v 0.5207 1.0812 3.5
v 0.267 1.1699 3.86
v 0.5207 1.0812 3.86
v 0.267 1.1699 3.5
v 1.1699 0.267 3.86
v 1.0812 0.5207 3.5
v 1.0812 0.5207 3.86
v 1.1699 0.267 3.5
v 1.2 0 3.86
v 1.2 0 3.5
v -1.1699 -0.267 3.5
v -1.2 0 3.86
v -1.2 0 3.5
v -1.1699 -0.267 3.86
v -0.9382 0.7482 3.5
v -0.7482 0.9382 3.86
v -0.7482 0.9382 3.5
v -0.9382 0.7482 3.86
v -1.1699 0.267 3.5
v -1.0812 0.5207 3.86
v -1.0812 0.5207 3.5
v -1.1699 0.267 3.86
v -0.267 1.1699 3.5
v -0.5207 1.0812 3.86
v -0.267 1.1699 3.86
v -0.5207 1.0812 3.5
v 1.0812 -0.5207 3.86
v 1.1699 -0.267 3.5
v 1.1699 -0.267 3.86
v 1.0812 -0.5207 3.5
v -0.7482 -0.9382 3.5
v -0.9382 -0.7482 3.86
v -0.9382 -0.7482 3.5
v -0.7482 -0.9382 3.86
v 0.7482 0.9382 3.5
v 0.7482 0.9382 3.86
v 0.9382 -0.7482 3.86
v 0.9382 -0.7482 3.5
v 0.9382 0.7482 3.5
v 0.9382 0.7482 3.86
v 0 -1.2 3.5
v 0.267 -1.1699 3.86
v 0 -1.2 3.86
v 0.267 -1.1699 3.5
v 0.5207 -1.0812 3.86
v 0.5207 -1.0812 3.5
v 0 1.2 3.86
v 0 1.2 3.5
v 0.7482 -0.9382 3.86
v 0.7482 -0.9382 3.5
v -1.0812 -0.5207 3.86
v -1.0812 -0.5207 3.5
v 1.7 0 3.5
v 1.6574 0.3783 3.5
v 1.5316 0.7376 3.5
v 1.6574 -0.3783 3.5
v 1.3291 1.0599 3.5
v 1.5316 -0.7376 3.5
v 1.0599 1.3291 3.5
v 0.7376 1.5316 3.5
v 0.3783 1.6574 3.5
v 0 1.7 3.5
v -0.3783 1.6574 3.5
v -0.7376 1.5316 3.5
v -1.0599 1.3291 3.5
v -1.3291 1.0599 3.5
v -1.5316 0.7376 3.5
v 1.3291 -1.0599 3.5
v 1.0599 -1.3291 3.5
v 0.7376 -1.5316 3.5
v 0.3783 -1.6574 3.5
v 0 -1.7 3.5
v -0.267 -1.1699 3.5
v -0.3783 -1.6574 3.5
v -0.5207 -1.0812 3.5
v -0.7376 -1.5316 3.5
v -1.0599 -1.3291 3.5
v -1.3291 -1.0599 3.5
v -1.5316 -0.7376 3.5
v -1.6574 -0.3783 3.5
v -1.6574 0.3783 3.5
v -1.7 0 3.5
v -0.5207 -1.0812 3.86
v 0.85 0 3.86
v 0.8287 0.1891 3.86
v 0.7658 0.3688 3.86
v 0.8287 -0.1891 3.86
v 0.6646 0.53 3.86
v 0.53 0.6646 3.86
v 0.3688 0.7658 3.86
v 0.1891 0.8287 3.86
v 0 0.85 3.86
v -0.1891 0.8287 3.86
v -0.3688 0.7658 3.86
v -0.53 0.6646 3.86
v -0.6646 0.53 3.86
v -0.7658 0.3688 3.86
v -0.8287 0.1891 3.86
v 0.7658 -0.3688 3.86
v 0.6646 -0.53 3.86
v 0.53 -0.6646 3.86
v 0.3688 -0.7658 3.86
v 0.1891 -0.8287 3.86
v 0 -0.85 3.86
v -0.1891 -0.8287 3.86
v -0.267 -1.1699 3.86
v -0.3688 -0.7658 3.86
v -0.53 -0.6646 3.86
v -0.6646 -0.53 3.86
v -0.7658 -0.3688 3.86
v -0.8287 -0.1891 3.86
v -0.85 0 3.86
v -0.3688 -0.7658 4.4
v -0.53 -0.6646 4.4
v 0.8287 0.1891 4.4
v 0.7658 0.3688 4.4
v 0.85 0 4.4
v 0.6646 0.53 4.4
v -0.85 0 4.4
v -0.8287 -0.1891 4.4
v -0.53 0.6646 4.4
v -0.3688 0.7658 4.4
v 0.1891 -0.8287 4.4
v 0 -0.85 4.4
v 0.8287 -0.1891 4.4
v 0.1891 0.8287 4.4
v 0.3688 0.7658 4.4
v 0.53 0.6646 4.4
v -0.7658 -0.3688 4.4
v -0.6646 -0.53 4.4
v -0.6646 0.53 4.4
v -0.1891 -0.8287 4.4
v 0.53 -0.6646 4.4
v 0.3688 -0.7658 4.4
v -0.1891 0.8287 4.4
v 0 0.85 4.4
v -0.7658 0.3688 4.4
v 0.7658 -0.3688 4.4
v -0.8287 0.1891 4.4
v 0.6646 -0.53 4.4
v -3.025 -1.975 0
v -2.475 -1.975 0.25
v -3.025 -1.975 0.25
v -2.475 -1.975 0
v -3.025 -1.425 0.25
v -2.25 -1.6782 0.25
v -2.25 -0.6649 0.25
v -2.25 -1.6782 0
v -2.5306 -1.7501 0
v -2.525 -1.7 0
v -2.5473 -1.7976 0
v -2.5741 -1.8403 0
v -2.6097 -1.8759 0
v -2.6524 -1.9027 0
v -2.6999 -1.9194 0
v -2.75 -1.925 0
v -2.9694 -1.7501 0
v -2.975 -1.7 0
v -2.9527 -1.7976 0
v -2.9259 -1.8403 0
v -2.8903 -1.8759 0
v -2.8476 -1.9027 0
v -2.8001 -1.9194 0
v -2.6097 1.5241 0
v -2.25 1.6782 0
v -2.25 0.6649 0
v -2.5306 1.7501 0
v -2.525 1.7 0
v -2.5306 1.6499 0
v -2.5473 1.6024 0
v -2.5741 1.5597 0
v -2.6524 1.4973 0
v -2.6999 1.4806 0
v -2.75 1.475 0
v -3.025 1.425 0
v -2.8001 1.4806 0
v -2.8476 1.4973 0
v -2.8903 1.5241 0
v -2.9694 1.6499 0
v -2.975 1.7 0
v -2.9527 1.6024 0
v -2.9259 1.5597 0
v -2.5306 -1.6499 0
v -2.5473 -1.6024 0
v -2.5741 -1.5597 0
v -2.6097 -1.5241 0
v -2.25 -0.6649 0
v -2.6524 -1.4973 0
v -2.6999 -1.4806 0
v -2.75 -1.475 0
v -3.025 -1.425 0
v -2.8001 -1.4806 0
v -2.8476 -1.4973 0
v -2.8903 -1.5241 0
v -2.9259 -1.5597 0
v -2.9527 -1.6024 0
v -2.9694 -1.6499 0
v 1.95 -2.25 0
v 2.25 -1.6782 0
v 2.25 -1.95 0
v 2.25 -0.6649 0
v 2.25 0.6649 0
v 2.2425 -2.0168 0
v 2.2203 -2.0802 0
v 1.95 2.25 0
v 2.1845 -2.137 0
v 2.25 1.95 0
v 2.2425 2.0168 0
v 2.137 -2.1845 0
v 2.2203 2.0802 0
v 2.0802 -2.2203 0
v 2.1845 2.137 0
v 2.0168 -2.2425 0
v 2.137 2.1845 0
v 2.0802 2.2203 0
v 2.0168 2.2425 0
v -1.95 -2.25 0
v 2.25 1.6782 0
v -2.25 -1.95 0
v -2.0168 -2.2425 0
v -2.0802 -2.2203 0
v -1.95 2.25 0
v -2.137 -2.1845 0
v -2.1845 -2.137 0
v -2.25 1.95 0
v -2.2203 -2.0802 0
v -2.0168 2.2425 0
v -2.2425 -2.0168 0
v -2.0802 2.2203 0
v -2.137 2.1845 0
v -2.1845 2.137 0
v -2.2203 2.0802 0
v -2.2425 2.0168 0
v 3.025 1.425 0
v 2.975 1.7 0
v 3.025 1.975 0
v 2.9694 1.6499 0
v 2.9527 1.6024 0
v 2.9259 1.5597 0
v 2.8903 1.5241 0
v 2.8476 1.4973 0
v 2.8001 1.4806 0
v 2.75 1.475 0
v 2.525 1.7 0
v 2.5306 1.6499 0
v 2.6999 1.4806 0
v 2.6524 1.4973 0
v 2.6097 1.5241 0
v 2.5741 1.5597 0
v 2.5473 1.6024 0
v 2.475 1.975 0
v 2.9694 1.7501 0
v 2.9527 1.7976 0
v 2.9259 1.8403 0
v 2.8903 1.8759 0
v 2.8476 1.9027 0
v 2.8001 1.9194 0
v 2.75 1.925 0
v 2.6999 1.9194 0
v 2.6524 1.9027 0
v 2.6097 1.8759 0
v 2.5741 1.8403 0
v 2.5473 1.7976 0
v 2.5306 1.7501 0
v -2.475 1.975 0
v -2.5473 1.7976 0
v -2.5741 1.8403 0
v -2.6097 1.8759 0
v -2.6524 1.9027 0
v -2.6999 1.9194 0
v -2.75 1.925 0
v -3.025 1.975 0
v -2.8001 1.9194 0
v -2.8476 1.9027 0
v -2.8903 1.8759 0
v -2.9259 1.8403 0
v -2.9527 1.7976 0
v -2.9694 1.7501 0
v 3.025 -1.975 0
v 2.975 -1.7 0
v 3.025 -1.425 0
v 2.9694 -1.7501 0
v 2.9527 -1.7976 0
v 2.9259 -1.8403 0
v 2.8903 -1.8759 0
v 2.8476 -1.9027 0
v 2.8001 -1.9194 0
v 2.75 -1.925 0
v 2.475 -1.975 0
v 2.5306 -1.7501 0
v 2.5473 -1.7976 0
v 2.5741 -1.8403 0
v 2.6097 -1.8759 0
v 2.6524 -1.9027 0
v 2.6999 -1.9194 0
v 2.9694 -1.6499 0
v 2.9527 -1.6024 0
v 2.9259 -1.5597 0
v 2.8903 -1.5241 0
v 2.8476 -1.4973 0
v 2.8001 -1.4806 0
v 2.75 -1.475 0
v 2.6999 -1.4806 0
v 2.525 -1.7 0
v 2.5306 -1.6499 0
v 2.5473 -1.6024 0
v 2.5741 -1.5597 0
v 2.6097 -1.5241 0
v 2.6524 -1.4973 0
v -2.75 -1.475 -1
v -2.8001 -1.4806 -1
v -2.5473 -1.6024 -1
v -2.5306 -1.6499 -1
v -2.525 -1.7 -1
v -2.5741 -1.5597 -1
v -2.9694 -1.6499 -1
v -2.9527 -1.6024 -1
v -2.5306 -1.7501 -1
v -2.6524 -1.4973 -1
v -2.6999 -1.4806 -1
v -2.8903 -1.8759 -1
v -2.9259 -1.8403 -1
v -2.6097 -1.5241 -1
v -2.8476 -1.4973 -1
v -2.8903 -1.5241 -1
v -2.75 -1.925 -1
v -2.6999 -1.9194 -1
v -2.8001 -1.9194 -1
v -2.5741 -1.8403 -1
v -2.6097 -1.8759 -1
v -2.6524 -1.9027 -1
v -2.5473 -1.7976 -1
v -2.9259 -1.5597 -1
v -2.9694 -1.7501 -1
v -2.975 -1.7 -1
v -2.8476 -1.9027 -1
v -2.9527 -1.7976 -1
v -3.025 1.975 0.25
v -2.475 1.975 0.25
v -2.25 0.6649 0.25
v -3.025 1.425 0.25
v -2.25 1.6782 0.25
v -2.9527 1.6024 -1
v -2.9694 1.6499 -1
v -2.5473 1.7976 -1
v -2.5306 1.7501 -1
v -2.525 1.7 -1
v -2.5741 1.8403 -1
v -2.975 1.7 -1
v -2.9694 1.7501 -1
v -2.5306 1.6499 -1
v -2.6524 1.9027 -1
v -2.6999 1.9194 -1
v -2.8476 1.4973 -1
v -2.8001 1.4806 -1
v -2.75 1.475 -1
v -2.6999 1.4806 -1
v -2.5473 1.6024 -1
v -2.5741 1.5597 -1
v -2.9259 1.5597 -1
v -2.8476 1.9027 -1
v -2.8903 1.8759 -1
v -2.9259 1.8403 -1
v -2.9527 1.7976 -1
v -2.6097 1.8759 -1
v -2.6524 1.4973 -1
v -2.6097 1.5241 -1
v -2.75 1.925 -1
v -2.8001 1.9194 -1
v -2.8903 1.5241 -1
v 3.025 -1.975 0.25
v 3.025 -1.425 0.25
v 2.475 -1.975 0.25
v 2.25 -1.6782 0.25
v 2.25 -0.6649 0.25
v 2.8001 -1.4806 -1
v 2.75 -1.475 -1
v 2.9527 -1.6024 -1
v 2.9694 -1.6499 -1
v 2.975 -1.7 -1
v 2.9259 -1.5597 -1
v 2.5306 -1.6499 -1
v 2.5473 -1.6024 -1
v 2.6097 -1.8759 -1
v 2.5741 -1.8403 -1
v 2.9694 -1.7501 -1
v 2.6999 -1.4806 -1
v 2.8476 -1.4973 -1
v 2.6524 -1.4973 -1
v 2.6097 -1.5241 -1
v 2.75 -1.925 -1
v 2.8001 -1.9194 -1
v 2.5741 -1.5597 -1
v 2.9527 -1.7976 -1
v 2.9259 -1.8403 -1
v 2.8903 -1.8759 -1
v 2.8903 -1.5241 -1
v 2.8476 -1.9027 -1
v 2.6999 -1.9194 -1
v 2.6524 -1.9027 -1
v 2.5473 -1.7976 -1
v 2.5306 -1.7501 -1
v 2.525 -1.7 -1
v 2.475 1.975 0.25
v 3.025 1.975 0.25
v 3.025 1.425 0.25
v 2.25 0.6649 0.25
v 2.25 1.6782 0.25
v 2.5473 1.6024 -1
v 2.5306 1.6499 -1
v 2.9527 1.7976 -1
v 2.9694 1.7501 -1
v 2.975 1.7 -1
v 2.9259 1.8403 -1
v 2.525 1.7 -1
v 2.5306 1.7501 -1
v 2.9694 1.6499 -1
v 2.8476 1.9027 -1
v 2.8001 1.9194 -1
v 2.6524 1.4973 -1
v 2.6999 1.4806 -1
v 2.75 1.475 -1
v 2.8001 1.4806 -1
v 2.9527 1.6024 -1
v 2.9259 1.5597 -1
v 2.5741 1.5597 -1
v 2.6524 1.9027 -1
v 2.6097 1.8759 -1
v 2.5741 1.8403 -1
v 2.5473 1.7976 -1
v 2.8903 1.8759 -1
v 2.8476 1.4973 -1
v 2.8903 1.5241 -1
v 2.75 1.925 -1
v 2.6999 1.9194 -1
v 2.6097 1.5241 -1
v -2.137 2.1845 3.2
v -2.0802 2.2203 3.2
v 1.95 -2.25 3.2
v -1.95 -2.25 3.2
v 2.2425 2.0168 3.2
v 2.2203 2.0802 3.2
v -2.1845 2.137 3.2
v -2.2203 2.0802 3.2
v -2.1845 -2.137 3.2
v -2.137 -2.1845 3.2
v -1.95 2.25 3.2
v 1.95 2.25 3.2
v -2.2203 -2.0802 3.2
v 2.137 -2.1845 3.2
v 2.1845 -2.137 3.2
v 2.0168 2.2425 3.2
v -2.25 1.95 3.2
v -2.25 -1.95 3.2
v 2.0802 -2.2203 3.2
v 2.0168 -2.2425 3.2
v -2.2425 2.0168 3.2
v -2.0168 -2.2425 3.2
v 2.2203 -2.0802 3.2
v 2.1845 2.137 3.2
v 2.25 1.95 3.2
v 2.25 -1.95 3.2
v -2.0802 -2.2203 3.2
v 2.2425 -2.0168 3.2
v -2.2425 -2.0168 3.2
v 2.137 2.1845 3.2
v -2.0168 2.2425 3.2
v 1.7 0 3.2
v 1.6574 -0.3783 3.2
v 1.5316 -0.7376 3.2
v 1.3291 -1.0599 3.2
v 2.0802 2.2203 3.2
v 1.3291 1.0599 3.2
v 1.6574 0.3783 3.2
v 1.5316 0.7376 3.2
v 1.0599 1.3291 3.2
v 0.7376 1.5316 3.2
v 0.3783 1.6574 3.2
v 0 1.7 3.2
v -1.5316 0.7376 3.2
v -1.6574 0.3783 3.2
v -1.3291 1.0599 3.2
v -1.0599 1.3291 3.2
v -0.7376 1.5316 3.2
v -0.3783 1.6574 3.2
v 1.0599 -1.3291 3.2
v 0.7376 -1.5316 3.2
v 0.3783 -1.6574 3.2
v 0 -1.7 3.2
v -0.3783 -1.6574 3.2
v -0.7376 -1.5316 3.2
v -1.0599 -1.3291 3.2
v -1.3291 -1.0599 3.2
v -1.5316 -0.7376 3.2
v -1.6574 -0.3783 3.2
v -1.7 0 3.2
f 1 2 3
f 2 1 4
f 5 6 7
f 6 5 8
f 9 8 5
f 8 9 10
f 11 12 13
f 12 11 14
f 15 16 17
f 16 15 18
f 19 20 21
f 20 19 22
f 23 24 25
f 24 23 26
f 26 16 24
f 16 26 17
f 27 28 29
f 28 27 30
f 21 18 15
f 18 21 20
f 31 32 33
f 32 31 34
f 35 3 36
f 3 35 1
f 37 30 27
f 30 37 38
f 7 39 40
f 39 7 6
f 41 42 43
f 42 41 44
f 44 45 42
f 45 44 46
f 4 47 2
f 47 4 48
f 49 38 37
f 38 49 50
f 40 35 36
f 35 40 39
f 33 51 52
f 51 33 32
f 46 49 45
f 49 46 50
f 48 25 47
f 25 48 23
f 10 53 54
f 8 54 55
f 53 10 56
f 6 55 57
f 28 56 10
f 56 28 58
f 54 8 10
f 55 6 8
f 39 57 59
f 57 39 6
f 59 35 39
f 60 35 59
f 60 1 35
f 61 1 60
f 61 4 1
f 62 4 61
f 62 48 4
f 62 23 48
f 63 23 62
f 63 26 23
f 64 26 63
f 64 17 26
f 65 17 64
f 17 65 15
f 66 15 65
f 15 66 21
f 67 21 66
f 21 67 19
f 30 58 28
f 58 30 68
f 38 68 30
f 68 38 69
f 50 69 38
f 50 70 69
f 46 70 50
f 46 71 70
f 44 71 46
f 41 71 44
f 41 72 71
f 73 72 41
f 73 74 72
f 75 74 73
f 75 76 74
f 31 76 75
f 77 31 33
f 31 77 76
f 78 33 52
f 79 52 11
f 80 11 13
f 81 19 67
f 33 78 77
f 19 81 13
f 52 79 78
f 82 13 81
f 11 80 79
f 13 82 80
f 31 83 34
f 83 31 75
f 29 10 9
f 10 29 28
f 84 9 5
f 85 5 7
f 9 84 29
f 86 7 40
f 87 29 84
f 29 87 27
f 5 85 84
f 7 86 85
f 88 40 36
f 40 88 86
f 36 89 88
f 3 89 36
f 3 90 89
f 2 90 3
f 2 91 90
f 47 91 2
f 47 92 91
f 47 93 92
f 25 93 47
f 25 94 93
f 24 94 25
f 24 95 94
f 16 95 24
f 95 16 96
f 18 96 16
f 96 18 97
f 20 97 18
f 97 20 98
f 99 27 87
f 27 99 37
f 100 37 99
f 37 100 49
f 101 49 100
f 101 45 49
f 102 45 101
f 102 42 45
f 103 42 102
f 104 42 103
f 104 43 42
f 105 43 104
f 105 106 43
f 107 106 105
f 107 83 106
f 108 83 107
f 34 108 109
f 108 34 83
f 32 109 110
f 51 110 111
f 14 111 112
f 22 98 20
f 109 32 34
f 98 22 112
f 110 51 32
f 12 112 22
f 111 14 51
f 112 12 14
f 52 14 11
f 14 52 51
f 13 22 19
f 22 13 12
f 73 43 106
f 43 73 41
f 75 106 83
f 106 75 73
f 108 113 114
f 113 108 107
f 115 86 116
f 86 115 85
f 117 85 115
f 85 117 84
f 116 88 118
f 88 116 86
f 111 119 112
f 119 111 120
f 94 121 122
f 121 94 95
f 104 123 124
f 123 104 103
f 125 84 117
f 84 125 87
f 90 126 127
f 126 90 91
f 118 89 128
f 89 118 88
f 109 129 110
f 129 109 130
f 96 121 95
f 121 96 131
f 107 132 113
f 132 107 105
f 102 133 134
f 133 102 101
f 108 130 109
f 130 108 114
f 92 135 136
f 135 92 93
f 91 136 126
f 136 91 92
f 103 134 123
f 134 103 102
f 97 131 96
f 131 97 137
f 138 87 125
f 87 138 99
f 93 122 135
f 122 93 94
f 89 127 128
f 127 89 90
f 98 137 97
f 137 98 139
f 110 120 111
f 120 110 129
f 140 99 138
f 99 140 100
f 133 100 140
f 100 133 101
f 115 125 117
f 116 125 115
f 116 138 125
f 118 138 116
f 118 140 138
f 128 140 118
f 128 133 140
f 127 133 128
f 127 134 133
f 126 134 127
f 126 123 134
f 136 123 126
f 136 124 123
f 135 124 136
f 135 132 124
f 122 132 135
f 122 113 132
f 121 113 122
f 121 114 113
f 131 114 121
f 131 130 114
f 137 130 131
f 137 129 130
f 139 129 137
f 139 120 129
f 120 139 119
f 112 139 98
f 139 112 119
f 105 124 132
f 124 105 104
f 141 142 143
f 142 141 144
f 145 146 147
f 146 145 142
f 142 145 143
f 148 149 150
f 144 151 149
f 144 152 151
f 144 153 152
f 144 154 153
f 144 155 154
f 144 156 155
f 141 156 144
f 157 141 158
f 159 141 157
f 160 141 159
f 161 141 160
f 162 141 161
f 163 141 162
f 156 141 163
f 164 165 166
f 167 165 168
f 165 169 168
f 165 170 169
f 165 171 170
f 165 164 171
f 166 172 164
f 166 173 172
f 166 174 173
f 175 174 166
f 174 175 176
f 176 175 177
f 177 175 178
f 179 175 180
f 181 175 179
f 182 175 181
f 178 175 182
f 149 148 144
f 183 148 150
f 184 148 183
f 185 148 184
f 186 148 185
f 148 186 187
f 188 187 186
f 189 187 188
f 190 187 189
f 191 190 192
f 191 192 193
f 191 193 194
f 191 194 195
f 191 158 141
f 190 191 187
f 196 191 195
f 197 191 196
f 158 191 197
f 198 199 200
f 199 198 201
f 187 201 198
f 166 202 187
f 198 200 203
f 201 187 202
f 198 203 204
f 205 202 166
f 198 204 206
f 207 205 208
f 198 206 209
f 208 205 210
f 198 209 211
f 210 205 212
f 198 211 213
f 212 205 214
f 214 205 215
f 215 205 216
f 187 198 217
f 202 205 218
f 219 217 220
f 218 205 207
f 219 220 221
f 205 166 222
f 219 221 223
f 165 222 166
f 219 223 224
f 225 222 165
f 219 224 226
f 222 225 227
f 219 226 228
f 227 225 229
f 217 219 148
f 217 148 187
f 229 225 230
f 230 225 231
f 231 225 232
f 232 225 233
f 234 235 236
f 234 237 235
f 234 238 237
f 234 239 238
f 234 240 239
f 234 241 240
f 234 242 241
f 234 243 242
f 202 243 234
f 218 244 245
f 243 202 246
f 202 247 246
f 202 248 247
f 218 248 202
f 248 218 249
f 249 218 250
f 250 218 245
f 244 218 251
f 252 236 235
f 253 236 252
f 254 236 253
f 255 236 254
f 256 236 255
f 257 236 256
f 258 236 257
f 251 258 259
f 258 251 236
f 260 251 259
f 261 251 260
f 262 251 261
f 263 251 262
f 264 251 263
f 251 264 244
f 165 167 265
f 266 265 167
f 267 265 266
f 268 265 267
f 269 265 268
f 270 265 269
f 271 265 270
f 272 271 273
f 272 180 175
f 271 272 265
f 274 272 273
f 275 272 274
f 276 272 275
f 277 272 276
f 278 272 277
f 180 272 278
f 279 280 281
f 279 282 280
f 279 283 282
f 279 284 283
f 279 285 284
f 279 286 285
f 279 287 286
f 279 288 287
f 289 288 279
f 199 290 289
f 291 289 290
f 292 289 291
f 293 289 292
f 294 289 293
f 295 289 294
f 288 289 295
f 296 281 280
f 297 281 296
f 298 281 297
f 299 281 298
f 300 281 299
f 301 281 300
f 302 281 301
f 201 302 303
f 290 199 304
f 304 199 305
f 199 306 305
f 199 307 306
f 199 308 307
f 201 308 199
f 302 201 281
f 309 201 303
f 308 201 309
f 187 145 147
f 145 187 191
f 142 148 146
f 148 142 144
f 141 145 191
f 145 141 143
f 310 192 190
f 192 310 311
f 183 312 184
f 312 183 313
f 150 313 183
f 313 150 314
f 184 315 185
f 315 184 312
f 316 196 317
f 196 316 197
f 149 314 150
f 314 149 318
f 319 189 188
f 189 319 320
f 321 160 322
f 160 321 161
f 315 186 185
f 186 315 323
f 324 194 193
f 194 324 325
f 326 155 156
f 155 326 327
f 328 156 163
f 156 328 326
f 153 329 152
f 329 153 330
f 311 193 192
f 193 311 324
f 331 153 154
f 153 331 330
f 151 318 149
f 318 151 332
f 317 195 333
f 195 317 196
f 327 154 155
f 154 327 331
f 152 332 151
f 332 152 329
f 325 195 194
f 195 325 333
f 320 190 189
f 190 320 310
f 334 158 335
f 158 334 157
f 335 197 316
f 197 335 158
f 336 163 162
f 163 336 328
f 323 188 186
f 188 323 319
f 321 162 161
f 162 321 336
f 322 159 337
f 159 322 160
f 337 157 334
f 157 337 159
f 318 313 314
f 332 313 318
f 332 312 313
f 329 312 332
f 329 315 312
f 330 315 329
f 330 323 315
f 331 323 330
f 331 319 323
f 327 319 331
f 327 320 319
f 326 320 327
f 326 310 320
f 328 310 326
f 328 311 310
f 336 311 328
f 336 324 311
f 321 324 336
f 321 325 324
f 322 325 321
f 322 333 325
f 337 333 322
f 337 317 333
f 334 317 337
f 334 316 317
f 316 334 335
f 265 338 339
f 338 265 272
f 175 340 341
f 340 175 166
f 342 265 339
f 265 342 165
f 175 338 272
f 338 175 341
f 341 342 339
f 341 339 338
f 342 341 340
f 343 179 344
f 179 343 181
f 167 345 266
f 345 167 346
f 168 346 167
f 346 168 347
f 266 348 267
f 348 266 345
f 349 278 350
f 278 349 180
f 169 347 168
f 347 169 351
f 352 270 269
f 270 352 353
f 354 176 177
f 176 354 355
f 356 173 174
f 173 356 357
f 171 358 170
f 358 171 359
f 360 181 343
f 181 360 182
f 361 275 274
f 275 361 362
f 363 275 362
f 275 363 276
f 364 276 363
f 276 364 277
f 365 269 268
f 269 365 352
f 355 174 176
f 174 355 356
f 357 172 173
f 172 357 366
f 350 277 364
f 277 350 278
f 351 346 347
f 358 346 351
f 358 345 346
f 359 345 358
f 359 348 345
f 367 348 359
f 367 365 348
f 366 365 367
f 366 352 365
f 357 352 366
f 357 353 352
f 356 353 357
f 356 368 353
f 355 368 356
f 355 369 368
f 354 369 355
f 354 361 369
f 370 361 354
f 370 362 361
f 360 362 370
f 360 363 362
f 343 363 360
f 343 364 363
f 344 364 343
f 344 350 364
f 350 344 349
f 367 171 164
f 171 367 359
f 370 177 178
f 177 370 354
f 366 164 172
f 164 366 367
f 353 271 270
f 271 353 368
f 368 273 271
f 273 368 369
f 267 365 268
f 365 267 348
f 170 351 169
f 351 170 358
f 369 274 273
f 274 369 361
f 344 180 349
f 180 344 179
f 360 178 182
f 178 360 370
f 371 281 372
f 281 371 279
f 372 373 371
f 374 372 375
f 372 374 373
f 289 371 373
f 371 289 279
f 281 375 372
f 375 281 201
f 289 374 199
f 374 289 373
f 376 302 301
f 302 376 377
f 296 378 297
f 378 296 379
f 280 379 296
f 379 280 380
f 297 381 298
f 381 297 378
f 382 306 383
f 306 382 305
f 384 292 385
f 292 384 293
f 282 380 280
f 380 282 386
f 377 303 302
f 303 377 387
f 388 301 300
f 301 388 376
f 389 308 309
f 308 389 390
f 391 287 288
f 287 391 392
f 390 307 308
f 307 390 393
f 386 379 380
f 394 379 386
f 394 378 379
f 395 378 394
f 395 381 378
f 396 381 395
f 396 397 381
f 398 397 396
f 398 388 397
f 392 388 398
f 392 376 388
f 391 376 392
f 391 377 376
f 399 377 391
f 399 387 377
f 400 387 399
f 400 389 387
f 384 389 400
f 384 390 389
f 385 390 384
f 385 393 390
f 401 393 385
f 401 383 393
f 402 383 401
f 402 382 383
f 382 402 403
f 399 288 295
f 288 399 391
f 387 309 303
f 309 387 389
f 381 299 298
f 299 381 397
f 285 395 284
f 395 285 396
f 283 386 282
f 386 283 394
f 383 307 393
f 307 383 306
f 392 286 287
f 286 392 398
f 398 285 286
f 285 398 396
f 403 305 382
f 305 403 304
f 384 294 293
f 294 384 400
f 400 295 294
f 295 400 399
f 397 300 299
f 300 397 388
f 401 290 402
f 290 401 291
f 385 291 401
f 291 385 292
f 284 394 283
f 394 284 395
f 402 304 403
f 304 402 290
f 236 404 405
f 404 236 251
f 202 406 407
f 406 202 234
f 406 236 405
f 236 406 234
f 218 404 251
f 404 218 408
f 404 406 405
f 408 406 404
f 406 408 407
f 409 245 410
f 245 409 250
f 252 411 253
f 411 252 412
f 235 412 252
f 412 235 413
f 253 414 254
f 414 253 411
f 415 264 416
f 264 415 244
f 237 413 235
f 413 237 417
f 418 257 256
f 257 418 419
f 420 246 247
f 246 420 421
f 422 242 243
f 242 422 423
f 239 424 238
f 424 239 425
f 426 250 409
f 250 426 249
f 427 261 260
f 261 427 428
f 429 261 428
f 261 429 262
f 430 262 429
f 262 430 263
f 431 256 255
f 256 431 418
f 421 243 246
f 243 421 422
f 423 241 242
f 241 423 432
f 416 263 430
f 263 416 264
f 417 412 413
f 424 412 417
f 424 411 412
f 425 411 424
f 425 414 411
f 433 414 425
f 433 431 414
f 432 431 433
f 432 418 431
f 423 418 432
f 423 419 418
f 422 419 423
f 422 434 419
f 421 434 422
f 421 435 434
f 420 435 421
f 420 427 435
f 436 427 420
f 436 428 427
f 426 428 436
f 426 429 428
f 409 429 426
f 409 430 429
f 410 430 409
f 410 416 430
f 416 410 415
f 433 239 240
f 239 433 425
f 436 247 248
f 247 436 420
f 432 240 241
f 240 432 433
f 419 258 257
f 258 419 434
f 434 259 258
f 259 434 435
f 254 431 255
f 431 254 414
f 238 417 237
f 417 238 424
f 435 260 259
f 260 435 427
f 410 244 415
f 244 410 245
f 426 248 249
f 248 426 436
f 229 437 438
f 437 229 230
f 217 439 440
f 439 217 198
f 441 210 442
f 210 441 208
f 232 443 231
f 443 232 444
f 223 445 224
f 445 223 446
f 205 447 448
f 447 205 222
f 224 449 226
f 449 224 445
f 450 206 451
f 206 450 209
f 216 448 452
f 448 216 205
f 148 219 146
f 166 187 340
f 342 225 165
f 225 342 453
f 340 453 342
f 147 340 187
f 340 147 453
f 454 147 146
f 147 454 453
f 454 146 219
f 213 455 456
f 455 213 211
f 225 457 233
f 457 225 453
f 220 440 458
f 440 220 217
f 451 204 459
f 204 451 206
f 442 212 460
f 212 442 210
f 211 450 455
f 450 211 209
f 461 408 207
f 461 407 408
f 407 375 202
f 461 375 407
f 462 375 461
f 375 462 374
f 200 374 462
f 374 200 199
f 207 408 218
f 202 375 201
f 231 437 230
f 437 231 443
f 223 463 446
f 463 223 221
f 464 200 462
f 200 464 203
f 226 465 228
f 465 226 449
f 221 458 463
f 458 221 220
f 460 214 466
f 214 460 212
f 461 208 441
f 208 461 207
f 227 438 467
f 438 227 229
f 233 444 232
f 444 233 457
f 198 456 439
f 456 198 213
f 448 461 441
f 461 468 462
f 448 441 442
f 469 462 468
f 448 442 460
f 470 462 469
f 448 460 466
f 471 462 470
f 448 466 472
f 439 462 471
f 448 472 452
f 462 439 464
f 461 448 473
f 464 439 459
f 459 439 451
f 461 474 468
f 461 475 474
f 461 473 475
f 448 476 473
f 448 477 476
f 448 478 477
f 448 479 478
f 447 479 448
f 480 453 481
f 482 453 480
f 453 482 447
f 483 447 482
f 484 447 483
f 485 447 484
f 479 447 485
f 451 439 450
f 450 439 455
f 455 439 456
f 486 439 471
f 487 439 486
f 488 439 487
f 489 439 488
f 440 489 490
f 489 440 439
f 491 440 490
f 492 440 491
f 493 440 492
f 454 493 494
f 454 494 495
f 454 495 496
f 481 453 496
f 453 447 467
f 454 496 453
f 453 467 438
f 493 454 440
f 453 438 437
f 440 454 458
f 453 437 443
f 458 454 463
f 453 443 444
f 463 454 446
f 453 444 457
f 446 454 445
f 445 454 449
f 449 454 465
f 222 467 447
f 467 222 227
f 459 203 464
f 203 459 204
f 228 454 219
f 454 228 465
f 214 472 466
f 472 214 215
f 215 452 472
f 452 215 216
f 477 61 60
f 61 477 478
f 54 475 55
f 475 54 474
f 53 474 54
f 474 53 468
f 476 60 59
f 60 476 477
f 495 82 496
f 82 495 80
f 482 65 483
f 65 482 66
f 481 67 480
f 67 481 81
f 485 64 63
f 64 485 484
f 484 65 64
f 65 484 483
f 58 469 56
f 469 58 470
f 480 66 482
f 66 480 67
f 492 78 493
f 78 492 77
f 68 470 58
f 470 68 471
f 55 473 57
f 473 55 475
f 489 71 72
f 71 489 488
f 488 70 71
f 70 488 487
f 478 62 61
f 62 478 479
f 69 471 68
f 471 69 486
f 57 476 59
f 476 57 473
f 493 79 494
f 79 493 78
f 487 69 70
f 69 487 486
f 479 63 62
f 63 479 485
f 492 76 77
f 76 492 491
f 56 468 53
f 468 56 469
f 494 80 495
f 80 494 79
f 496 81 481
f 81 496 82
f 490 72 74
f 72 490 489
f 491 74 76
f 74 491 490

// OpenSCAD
// SW_SPST_4.5×4.5 THT — 焊盘中心 (±2.75, ±1.7) 与封装一致
// 金属爪从壳体边沿弯到焊盘再穿板；板厚 1.0 → 板下只留短焊脚
$fn = 28;

body = 4.5;
body_h = 3.20;
cap_t = 0.30;
act_d = 2.40;
act_h = 0.90;
stem_d = 1.70;
// 板下露出：约 1.0mm（1.0 板厚 + 少许焊脚，不再 3.2）
pin_below = 1.00;
pin_d = 0.45;
claw_t = 0.25;
claw_w = 0.55;
pad_xs = [-2.75, 2.75];
pad_ys = [-1.70, 1.70];

module rounded_box(w, d, h, r) {
  rr = min(r, w / 2 - 0.05, d / 2 - 0.05);
  hull()
    for (sx = [-1, 1], sy = [-1, 1])
      translate([sx * (w / 2 - rr), sy * (d / 2 - rr), 0])
        cylinder(h = h, r = rr);
}

// 一只爪：壳体侧壁 → 水平伸出到焊盘 XY → 竖直短脚穿板
module claw(px, py) {
  // 从壳体底边朝焊盘方向的水平臂（贴地）
  bx = (px > 0 ? 1 : -1) * (body / 2);
  hull() {
    translate([bx * 0.92, py * 0.55, claw_t / 2])
      cube([0.35, claw_w, claw_t], center = true);
    translate([px, py, claw_t / 2])
      cube([claw_w, claw_w, claw_t], center = true);
  }
  // 穿板短脚（Z=0 为 F.Cu，向下为负）
  translate([px, py, -pin_below / 2])
    cylinder(h = pin_below, d = pin_d, center = true);
}

color([0.18, 0.18, 0.2])
  rounded_box(body, body, body_h, 0.30);

color([0.10, 0.10, 0.11])
  translate([0, 0, body_h])
    cylinder(h = cap_t, d = act_d + 1.0);

color([0.08, 0.08, 0.09]) {
  translate([0, 0, body_h + cap_t])
    cylinder(h = act_h * 0.4, d = act_d);
  translate([0, 0, body_h + cap_t + act_h * 0.4])
    cylinder(h = act_h * 0.6, d = stem_d);
}

color("silver") {
  for (px = pad_xs, py = pad_ys)
    claw(px, py);
}
